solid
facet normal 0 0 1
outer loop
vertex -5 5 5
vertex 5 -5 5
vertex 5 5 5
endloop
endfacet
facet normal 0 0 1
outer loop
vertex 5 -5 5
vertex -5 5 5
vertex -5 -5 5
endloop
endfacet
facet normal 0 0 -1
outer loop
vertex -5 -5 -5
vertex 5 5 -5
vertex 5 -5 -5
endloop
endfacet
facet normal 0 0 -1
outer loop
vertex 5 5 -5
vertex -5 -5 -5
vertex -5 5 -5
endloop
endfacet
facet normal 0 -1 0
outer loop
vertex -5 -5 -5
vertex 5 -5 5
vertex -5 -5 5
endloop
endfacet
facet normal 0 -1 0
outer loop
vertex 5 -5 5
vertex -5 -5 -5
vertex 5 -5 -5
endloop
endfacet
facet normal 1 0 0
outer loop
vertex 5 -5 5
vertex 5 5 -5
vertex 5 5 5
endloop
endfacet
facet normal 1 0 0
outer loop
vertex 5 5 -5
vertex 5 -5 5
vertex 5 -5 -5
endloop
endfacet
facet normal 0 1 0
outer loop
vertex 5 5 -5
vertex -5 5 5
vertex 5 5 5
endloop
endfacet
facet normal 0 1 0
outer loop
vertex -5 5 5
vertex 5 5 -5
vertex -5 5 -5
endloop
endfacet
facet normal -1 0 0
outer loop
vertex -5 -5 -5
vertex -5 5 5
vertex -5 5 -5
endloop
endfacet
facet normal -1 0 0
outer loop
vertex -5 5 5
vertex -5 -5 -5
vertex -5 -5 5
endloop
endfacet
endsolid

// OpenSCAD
translate([-0.000000, -0.000000, -0.000000])
cube(size = [10.000000, 10.000000, 10.000000], center = true);
